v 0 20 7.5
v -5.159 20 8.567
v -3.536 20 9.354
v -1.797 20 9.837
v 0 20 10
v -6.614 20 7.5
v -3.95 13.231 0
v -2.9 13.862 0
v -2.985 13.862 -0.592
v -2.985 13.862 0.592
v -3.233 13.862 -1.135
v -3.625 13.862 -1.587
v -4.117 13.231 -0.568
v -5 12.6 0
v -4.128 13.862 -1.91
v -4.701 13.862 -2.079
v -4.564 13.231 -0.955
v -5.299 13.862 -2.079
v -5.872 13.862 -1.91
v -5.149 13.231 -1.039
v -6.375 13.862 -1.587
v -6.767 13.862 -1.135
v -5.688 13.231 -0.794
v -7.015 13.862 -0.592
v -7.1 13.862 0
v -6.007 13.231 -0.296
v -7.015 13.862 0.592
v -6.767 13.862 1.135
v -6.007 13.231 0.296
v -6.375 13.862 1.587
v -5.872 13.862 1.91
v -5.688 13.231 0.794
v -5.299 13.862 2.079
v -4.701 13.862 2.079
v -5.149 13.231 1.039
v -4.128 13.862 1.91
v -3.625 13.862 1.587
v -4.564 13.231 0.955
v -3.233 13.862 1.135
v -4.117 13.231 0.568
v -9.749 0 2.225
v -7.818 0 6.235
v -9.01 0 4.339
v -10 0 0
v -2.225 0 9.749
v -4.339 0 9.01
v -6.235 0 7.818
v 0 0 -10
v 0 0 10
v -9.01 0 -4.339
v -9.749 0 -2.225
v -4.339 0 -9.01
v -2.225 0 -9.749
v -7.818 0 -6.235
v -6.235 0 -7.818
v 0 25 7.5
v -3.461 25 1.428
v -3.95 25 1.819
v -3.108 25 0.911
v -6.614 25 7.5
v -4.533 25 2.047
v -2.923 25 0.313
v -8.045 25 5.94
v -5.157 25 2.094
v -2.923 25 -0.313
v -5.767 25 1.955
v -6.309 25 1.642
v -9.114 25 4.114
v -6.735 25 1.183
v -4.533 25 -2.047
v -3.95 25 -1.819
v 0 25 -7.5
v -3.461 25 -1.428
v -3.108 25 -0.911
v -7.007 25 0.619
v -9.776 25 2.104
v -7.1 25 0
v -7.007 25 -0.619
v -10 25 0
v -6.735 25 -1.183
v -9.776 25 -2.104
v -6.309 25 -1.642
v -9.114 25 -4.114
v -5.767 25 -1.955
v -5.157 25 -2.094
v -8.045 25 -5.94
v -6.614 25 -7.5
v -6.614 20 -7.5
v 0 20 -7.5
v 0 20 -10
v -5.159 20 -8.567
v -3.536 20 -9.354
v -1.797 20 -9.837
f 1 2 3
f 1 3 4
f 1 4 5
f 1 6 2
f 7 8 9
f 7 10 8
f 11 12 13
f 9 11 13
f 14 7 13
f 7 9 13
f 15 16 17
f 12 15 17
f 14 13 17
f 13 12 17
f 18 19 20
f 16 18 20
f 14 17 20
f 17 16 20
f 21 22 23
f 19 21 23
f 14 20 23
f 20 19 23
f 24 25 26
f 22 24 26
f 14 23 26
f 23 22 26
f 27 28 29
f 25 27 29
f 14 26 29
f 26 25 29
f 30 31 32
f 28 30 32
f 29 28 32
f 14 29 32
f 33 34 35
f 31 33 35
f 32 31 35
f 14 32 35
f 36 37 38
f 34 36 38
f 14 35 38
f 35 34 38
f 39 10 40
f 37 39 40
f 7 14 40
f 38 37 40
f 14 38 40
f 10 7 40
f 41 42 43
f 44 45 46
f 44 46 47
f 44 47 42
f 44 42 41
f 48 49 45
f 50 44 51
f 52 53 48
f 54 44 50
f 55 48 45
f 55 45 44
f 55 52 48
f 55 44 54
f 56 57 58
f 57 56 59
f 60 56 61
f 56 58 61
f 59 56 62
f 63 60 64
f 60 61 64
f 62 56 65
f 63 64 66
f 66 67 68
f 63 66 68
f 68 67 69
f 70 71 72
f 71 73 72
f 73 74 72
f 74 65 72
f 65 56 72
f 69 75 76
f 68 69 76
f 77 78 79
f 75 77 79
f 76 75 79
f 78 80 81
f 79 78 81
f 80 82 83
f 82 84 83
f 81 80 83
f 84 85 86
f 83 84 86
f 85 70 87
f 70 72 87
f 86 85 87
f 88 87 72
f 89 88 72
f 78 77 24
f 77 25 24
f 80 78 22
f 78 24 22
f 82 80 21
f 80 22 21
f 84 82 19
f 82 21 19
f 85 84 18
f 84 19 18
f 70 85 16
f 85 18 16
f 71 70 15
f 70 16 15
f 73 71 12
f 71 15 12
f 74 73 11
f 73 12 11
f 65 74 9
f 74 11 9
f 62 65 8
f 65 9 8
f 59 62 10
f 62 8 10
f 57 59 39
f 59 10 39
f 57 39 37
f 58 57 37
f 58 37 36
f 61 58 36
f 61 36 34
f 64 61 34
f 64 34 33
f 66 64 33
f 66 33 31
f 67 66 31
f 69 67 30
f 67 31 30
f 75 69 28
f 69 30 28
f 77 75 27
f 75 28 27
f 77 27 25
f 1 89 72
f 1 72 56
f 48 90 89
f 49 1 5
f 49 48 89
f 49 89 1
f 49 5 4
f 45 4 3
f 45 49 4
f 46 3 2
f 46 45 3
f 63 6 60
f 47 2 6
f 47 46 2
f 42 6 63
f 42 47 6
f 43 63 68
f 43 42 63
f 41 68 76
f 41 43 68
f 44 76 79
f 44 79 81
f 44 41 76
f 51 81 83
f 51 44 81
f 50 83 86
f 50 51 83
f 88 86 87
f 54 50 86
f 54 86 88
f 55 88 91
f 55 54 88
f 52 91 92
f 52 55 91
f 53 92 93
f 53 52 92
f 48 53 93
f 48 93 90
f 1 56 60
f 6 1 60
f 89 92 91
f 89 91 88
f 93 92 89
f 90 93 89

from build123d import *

# Parameters (mm, degrees)
BOSS_EXTRUDE1_DEPTH   = 25
CUT_EXTRUDE1_DEPTH    = 5
M5_TAPPED_HOLE1_D     = 4.2
M5_TAPPED_HOLE1_DEPTH = 11.1381927
M5_TAPPED_HOLE1_TIP   = 1.2618073


with BuildPart() as part:
    # Sketch1 → Boss-Extrude1 (new body)
    with BuildSketch(Plane(origin=(0, 0, 0), x_dir=(1, 0, 0), z_dir=(0, 1, 0))):
        with BuildLine():
            Line((0, 10), (0, -10))
            ThreePointArc((0, -10), (-10, 0), (0, 10))
        make_face()
    extrude(amount=BOSS_EXTRUDE1_DEPTH)

    # Sketch18 → Cut-Extrude1 (cut)
    with BuildSketch(Plane(origin=(0, 25, 0), x_dir=(1, 0, 0), z_dir=(0, 1, 0))):
        with BuildLine():
            Line((0, 7.5), (0, 10))
            ThreePointArc((0, 10), (-3.535533906, 9.354143467), (-6.614378278, 7.5))
            Line((-6.614378278, 7.5), (0, 7.5))
        make_face()
        with BuildLine():
            Line((0, -10), (0, -7.5))
            Line((0, -7.5), (-6.614378278, -7.5))
            ThreePointArc((-6.614378278, -7.5), (-3.535533906, -9.354143467), (0, -10))
        make_face()
    extrude(amount=-CUT_EXTRUDE1_DEPTH, mode=Mode.SUBTRACT)

    # M5 Tapped Hole1
    with Locations(Plane(origin=(0, 25, 0), x_dir=(1, 0, 0), z_dir=(0, 1, 0))):
        with Locations((-5, 0)):
            Hole(M5_TAPPED_HOLE1_D / 2, depth=M5_TAPPED_HOLE1_DEPTH)
            with Locations((0, 0, -(M5_TAPPED_HOLE1_DEPTH + M5_TAPPED_HOLE1_TIP / 2))):  # 118° drill point
                Cone(0, M5_TAPPED_HOLE1_D / 2, M5_TAPPED_HOLE1_TIP, mode=Mode.SUBTRACT)


solid = part.part
